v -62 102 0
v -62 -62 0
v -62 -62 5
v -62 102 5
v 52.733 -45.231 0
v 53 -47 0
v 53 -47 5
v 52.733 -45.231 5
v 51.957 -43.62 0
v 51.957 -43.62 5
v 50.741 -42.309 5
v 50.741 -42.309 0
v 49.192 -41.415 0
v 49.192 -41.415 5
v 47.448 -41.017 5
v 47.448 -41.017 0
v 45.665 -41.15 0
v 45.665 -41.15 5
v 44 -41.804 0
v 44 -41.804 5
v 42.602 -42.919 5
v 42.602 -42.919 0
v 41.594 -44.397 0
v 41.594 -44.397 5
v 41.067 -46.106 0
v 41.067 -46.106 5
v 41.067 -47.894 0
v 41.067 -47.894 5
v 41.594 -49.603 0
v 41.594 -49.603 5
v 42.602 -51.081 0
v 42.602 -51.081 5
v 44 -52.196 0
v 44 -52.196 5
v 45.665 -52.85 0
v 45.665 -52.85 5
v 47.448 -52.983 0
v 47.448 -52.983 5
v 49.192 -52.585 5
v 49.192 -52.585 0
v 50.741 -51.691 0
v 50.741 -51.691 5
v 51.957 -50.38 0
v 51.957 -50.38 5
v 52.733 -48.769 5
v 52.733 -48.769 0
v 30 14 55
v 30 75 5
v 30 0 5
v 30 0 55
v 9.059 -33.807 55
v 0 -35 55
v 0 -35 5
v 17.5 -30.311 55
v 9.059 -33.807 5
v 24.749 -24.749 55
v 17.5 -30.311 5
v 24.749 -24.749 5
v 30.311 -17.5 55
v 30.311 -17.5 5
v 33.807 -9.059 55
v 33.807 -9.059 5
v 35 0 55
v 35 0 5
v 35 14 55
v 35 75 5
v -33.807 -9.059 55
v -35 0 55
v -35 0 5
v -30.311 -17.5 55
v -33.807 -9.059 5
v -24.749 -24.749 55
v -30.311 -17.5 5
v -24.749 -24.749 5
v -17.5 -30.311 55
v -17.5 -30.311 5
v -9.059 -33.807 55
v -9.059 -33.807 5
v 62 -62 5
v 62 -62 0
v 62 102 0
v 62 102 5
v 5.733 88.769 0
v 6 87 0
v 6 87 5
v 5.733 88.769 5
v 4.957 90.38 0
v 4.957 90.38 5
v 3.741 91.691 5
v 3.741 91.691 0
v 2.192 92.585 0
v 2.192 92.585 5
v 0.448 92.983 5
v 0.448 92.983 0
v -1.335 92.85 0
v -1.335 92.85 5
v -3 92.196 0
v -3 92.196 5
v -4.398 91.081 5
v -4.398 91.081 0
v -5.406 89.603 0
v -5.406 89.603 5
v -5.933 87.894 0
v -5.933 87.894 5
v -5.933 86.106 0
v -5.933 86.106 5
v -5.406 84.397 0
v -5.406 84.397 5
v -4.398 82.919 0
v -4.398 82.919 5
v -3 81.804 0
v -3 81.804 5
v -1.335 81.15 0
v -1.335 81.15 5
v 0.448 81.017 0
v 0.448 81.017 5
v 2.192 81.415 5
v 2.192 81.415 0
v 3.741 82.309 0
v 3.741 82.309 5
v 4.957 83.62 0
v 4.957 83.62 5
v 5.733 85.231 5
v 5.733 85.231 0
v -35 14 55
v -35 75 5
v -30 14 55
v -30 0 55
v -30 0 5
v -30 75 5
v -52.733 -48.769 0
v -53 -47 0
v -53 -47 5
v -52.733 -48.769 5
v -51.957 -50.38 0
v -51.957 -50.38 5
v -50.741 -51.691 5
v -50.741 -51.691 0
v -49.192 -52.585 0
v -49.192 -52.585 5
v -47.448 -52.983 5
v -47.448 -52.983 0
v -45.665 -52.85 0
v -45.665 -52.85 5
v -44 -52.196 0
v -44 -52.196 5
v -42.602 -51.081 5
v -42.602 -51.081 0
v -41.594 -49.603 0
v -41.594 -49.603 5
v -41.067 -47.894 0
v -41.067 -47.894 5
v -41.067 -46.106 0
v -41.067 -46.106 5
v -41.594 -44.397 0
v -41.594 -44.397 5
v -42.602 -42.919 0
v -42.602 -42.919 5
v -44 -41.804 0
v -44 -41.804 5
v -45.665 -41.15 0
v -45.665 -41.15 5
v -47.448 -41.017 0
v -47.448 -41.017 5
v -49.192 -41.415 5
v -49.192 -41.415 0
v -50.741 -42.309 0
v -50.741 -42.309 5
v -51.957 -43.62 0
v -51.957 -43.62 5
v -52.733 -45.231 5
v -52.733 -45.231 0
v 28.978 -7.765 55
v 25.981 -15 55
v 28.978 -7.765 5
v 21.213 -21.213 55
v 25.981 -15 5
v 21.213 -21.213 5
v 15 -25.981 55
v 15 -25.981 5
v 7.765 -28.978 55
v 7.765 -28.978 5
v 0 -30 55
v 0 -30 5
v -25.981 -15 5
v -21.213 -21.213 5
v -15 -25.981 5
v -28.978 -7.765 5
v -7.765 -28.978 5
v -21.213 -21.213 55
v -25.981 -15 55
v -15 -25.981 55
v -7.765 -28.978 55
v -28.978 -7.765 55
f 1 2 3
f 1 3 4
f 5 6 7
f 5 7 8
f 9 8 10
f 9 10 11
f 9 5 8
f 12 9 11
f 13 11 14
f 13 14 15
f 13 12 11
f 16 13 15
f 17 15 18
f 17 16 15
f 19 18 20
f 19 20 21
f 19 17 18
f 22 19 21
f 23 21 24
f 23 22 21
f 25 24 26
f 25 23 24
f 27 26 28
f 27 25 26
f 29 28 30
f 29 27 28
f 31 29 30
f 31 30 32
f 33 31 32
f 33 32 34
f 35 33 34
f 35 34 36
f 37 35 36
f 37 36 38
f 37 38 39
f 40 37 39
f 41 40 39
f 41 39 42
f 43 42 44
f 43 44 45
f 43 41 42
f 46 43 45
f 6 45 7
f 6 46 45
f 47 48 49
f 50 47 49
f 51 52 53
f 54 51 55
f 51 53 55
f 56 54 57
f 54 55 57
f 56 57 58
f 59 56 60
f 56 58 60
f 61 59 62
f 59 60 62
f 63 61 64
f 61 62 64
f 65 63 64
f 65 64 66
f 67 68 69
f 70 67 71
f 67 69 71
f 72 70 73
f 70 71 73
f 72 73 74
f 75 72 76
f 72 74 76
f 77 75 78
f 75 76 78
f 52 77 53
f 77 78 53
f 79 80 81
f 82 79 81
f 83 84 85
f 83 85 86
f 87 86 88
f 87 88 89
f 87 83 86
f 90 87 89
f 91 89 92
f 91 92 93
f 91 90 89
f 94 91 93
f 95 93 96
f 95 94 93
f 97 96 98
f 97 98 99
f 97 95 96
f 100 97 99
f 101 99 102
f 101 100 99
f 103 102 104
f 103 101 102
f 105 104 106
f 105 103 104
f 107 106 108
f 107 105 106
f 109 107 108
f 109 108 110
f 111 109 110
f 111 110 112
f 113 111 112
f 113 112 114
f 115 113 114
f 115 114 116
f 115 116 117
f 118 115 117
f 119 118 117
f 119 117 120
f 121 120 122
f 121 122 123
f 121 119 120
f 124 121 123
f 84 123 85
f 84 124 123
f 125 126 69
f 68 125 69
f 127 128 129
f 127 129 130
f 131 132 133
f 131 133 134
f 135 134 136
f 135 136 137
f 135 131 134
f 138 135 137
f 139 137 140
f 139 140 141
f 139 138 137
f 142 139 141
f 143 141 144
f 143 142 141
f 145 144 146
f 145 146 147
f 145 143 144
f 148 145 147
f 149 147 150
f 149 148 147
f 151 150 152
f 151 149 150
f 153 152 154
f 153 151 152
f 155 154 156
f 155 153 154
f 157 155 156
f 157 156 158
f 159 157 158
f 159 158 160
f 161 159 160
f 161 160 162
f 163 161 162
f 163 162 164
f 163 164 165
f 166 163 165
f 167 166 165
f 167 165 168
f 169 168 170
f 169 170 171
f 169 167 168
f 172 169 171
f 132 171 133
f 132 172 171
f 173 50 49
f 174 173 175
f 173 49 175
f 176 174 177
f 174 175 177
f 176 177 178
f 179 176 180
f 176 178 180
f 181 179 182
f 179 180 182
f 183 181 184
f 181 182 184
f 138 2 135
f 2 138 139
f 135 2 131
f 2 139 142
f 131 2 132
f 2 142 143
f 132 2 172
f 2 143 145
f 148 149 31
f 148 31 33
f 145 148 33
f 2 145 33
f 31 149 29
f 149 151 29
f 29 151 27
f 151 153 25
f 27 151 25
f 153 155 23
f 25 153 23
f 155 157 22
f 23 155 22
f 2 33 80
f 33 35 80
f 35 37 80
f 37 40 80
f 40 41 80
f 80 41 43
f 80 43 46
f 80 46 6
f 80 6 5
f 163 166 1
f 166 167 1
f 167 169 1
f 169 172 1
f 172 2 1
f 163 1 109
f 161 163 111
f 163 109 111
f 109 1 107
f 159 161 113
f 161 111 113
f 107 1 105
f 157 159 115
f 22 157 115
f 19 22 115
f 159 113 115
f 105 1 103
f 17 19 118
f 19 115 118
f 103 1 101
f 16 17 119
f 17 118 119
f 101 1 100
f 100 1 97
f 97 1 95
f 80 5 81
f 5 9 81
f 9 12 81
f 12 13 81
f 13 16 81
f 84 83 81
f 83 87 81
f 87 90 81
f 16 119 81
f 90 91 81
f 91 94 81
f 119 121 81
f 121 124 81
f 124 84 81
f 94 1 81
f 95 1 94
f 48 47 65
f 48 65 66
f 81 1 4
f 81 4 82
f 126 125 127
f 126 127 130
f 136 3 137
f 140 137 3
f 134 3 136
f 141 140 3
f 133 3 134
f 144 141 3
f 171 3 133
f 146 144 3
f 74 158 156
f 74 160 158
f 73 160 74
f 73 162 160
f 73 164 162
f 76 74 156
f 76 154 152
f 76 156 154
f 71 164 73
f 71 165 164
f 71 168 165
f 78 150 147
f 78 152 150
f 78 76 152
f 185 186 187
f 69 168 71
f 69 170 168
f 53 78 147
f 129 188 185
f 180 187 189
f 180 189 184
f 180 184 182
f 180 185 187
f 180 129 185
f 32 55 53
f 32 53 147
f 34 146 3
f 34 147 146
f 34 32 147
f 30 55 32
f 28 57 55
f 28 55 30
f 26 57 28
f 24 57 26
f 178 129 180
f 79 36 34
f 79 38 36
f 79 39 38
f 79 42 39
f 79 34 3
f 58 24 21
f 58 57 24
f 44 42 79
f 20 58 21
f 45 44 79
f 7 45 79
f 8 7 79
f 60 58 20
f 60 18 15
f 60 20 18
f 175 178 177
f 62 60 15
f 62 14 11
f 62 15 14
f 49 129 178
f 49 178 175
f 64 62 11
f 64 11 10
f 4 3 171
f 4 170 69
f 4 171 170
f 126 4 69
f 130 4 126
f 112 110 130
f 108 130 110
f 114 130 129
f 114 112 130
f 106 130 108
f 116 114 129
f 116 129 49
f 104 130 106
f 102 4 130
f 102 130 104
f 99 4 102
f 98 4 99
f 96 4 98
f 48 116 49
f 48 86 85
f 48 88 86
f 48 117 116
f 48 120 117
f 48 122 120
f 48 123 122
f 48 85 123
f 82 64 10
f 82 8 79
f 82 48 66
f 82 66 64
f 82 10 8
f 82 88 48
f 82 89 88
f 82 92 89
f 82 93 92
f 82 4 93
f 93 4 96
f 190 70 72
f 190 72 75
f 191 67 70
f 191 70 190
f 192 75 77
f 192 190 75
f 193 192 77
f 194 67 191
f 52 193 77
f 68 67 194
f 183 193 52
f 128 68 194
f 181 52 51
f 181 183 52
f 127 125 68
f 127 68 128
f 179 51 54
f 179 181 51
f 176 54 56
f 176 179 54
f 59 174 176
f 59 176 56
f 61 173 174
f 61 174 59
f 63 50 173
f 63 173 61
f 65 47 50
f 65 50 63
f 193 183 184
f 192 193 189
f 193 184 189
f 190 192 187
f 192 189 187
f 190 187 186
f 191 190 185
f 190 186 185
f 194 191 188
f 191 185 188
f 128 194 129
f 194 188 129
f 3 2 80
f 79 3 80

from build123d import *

# Parameters (mm, degrees)
SKETCH1_W               = 124
SKETCH1_H               = 164
SKETCH1_R               = 6
BOSS_EXTRUDE1_DEPTH     = 5
BOSS_EXTRUDE2_DEPTH     = 55
CUT_EXTRUDE1_DEPTH      = 152.122466894
CUT_EXTRUDE1_DEPTH_BACK = 152.122466894


with BuildPart() as part:
    # Sketch1 → Boss-Extrude1 (new body)
    with BuildSketch(Plane.XY):
        with Locations((0, 20)):
            Rectangle(SKETCH1_W, SKETCH1_H)
        with Locations((0, 87)):
            Circle(SKETCH1_R, mode=Mode.SUBTRACT)
        with Locations((47, -47)):
            Circle(SKETCH1_R, mode=Mode.SUBTRACT)
        with Locations((-47, -47)):
            Circle(SKETCH1_R, mode=Mode.SUBTRACT)
        with BuildLine():
            Line((35, 75), (35, 0))
            ThreePointArc((35, 0), (0, -35), (-35, 0))
            Line((-35, 0), (-35, 75))
            Line((-35, 75), (-30, 75))
            Line((-30, 75), (-30, 0))
            ThreePointArc((-30, 0), (0, -30), (30, 0))
            Line((30, 0), (30, 75))
            Line((30, 75), (35, 75))
        make_face(mode=Mode.SUBTRACT)
    extrude(amount=BOSS_EXTRUDE1_DEPTH)

    # Sketch1<2> → Boss-Extrude2 (add)
    with BuildSketch(Plane.XY):
        with BuildLine():
            Line((35, 0), (35, 75))
            Line((35, 75), (30, 75))
            Line((30, 75), (30, 0))
            ThreePointArc((30, 0), (0, -30), (-30, 0))
            Line((-30, 0), (-30, 75))
            Line((-30, 75), (-35, 75))
            Line((-35, 75), (-35, 0))
            ThreePointArc((-35, 0), (0, -35), (35, 0))
        make_face()
    extrude(amount=BOSS_EXTRUDE2_DEPTH)

    # Sketch2 → Cut-Extrude1 (cut, two sides: drawn at the far end of the back side and taken through both)
    with BuildSketch(Plane(origin=(35, 0, 0), x_dir=(0, 0, -1), z_dir=(1, 0, 0)).offset(-CUT_EXTRUDE1_DEPTH_BACK)):
        Polygon((-55, 14), (-5, 75), (-55, 75), align=None)
    extrude(amount=CUT_EXTRUDE1_DEPTH + CUT_EXTRUDE1_DEPTH_BACK, mode=Mode.SUBTRACT)


solid = part.part
